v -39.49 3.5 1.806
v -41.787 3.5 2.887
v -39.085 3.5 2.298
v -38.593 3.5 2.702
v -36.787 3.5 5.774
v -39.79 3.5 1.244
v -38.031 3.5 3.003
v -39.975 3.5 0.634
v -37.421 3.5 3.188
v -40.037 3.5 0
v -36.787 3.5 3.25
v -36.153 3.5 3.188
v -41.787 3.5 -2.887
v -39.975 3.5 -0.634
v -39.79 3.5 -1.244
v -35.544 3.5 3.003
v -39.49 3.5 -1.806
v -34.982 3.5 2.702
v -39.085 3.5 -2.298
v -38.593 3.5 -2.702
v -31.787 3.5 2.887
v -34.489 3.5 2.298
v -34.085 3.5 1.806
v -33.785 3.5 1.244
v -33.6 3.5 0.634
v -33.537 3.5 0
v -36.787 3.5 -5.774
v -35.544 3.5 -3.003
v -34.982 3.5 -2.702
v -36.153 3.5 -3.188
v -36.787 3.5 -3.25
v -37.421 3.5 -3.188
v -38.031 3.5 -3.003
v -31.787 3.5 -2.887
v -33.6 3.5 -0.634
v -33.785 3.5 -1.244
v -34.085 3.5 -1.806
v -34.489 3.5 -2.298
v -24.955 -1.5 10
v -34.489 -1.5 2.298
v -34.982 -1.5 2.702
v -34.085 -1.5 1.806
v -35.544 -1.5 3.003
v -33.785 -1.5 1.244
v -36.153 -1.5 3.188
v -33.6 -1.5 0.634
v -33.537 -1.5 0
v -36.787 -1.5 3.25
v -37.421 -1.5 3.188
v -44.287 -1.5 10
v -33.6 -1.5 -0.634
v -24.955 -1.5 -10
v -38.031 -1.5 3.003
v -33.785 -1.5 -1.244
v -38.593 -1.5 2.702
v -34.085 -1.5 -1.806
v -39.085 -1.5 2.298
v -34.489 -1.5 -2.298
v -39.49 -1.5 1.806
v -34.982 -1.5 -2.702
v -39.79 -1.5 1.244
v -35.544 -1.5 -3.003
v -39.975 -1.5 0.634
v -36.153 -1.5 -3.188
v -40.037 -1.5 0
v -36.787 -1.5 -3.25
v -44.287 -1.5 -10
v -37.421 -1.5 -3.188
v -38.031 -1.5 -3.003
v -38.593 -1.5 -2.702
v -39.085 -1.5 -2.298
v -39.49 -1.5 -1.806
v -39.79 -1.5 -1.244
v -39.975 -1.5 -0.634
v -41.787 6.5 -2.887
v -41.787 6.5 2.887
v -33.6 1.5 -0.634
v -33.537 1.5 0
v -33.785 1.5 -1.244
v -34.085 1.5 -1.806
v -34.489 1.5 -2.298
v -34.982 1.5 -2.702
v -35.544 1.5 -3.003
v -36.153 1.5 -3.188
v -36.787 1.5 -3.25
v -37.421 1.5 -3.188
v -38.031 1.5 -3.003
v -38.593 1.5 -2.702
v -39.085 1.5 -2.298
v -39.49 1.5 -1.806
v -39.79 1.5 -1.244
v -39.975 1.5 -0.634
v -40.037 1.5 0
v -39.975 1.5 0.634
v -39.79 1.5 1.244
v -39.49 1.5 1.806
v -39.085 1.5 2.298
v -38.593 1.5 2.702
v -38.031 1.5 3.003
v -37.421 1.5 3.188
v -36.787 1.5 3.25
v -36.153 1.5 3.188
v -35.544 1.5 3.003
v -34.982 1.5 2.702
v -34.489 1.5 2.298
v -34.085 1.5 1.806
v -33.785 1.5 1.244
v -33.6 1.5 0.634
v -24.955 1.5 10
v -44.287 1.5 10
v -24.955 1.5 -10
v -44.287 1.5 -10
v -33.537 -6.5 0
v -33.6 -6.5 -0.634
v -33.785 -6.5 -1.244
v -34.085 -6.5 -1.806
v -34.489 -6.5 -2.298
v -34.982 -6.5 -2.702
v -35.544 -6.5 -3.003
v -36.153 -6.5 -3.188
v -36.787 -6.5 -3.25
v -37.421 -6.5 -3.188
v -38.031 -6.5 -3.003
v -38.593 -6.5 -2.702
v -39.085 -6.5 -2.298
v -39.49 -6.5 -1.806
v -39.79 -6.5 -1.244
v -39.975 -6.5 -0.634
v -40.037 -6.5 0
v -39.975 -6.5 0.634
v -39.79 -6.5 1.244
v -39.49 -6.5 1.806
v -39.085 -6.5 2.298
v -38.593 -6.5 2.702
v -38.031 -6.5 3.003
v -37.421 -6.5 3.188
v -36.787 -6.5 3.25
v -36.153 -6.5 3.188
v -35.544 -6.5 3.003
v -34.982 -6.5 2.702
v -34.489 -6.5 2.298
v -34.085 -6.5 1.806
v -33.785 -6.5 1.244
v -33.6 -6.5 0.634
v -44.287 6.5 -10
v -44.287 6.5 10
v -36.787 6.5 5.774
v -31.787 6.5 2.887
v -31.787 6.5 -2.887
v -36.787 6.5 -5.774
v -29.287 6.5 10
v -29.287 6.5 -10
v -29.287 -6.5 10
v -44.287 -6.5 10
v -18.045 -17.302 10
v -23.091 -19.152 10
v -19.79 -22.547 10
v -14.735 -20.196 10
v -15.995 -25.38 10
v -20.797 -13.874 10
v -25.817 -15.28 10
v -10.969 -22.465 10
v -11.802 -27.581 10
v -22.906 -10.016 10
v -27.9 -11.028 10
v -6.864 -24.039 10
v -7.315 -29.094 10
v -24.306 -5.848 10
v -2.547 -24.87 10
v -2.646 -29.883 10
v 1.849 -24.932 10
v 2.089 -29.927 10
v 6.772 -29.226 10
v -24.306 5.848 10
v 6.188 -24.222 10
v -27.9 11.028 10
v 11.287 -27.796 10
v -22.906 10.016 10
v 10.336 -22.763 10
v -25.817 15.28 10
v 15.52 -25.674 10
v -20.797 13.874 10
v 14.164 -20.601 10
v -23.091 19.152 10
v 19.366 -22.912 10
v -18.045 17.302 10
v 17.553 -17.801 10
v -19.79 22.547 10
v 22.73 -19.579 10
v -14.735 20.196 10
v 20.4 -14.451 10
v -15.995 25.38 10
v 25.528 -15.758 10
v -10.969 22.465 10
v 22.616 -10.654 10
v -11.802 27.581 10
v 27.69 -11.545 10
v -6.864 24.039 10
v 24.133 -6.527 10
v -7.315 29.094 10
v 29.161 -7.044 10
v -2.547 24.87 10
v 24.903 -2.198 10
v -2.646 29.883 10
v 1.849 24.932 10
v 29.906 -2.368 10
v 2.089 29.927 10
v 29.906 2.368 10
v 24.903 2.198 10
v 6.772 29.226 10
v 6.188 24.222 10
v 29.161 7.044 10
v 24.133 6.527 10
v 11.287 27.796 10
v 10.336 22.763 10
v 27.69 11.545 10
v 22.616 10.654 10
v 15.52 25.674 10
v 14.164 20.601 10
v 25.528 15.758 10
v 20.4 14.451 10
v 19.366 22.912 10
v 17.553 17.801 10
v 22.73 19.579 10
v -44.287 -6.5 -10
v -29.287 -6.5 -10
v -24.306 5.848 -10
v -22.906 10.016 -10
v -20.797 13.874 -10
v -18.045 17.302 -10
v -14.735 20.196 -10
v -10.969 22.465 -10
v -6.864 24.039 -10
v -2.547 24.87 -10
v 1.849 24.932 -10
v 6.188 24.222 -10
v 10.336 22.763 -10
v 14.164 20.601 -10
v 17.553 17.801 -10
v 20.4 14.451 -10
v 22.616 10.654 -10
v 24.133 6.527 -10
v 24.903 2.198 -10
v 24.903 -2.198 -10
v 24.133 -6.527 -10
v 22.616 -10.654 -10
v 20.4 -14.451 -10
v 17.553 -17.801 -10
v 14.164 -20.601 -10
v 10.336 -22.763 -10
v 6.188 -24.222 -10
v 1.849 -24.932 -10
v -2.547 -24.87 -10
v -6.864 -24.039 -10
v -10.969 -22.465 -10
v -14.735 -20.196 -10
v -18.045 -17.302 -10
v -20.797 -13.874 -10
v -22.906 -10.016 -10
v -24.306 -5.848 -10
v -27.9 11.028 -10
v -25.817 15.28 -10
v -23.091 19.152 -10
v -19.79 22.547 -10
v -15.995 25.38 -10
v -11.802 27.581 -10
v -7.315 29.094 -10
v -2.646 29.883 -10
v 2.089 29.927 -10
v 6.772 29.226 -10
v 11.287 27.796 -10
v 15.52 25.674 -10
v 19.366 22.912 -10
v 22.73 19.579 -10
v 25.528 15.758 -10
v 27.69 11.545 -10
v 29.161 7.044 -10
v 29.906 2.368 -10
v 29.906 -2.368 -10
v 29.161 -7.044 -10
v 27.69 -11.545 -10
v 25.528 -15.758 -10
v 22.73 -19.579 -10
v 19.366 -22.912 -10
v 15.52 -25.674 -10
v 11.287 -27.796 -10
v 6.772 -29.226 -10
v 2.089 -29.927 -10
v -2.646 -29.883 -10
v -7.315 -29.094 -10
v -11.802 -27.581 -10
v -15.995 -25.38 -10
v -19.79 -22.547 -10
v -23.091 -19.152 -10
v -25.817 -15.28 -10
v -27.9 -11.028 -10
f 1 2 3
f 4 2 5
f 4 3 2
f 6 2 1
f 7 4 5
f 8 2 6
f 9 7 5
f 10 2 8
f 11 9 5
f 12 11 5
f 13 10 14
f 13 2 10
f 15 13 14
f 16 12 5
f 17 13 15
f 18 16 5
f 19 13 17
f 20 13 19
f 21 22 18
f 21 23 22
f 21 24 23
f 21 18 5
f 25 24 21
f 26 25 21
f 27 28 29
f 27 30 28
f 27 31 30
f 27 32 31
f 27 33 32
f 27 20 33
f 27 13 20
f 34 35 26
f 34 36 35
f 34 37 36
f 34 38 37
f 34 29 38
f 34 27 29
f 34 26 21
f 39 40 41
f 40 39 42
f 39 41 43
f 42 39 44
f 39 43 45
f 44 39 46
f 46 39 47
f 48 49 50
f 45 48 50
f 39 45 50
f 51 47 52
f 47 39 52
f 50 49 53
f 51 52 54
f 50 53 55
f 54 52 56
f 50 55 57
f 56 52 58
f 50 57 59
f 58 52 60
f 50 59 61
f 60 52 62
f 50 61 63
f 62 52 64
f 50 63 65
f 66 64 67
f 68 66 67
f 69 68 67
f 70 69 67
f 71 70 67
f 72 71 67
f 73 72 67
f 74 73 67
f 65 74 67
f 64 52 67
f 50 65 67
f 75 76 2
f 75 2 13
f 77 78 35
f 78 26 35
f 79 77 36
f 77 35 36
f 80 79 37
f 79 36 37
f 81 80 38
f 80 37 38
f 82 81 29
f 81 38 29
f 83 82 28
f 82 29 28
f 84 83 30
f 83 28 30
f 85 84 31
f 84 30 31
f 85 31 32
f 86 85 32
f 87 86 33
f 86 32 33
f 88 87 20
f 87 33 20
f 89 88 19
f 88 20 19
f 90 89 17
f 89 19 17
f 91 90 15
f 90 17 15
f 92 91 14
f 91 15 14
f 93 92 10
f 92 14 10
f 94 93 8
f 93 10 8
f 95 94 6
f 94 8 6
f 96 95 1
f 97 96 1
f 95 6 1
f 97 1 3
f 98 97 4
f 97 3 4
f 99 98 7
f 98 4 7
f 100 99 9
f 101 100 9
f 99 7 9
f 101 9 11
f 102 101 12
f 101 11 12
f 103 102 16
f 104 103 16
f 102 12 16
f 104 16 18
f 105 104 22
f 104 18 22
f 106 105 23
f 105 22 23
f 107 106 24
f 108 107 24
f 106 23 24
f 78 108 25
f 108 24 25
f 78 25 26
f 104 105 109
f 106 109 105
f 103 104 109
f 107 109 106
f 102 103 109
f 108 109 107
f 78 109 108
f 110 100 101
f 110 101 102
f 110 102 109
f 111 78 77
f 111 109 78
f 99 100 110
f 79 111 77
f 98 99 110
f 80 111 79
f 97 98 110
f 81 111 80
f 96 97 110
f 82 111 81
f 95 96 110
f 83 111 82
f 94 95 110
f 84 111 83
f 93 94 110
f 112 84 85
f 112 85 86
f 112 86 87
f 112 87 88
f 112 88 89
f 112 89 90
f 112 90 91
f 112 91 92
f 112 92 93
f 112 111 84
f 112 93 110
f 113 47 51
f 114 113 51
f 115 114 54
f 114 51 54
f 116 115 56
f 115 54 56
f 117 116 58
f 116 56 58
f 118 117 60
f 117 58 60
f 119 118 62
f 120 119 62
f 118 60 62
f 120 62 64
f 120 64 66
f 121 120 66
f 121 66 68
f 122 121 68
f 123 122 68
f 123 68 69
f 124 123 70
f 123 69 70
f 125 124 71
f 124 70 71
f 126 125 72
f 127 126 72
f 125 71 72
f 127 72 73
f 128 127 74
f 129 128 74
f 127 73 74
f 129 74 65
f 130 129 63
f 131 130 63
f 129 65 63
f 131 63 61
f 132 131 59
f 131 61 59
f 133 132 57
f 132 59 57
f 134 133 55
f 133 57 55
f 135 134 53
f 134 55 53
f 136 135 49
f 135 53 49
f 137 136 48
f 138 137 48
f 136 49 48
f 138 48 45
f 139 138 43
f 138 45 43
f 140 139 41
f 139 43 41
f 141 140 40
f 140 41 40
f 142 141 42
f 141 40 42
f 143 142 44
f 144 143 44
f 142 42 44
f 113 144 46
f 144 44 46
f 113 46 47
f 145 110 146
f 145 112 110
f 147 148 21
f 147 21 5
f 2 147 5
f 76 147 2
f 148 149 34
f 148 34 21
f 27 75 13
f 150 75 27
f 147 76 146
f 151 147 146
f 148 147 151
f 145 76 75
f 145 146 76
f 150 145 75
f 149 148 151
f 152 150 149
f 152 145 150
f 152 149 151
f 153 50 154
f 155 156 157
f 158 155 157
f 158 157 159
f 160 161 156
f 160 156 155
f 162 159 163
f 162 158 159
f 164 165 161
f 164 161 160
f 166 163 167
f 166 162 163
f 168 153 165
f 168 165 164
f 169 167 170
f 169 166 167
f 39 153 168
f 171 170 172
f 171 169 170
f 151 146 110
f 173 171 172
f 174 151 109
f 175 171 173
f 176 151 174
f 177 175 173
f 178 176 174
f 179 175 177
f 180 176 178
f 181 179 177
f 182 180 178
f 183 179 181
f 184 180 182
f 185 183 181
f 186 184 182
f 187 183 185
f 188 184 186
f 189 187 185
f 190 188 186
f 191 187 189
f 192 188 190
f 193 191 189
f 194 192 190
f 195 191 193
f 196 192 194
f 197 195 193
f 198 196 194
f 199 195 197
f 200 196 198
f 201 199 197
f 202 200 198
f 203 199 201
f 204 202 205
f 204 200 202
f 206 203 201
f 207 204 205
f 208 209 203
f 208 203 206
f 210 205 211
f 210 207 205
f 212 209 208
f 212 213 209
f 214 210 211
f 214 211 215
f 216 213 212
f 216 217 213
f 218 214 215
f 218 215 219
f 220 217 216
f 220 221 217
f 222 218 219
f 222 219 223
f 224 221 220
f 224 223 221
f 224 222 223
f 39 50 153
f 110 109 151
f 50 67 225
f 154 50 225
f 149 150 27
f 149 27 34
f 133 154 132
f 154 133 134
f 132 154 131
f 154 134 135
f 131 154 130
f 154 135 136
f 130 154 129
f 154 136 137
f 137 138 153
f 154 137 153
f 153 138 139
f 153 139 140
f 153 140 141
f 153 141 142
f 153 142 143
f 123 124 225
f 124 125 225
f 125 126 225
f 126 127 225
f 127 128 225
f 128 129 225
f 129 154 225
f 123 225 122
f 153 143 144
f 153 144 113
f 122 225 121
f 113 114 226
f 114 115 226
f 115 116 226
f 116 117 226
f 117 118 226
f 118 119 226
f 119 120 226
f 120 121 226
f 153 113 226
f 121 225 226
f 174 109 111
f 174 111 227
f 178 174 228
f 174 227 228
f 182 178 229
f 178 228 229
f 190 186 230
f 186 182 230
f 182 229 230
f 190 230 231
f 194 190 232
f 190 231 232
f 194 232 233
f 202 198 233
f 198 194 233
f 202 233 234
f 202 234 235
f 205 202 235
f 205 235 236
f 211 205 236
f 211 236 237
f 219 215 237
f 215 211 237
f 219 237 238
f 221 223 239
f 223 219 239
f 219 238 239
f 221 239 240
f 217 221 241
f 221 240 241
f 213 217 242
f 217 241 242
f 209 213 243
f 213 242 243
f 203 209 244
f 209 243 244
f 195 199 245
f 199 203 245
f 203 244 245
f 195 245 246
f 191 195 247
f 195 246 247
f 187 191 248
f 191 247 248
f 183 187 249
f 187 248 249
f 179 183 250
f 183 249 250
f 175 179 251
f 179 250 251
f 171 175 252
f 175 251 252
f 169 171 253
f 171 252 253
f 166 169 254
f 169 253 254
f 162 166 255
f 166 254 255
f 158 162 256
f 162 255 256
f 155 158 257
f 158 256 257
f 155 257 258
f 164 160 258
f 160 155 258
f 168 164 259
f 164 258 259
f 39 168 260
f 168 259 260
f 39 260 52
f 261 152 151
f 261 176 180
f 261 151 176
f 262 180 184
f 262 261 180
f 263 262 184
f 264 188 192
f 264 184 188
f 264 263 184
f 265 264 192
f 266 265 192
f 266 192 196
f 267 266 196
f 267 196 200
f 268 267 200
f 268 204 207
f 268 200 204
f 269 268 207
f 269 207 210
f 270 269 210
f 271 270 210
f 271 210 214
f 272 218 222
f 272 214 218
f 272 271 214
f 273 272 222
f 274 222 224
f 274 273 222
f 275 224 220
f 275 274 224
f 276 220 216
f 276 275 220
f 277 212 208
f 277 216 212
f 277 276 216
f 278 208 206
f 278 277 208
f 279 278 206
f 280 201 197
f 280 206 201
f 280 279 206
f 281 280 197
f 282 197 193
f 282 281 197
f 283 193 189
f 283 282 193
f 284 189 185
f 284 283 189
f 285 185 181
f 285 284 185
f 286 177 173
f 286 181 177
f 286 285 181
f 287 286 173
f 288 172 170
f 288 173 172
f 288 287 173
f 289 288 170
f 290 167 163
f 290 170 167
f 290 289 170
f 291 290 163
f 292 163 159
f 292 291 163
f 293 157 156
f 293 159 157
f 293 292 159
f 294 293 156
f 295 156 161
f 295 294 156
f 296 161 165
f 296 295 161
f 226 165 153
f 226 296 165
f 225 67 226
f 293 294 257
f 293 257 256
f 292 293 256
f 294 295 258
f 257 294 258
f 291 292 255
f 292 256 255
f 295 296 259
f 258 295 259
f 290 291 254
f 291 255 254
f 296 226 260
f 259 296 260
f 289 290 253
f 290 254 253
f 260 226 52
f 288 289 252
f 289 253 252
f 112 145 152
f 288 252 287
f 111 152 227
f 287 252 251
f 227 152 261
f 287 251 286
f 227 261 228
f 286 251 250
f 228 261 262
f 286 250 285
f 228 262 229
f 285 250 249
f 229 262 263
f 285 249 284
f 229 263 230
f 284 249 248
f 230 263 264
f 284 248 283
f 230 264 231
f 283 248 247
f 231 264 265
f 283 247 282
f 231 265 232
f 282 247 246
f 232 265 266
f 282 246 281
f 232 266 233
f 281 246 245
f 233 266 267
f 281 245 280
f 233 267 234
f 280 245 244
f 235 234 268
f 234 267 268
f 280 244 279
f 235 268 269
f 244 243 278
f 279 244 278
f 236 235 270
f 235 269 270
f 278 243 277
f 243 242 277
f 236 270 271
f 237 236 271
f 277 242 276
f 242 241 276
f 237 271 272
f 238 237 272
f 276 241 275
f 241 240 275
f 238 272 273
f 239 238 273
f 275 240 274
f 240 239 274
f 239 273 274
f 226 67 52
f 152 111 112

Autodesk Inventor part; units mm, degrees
ref_plane "YZ Plane" through (0, 0, 0) normal (1, 0, 0) x (0, 1, 0)
ref_plane "XZ Plane" through (0, 0, 0) normal (0, 1, 0) x (-1, 0, 0)
ref_plane "XY Plane" through (0, 0, 0) normal (0, 0, 1) x (1, 0, 0)
sketch "Skizze1" plane through (0, 0, 0) normal (0, 0, 1) x (1, 0, 0)
  circle A0 centre (0, 0) radius 25 construction
  circle A1 centre (0, 0) radius 30 construction
  line L0 (-24.955, 1.5) -> (-44.2874, 1.5)
  line L1 (-44.2874, 1.5) -> (-44.2874, 6.5)
  line L2 (-44.2874, 6.5) -> (-29.2874, 6.5)
  line L3 (-24.955, -1.5) -> (-44.2874, -1.5)
  line L4 (-44.2874, -1.5) -> (-44.2874, -6.5)
  line L5 (-44.2874, -6.5) -> (-29.2874, -6.5)
  arc A2 (-29.2874, -6.5) -> (-29.2874, 6.5) centre (0, 0) ccw
  arc A3 (-24.955, -1.5) -> (-24.955, 1.5) centre (0, 0) ccw
  line L6 (-59.1448, 0) -> (44.8575, 0) construction
  dimension "d0" = 50
  dimension "d1" = 60
  dimension "d2" = 5
  dimension "d4" = 3
  dimension "d5" = 15
extrude "Extrusion1" add sketch "Skizze1" along normal mid plane 20
sketch "Skizze2" plane through (-44.2874, 6.5, 10) normal (0, 1, 0) x (1, 0, 0)
  line L0 (0, 20) -> (15, 0) construction
  line L1 (15, 20) -> (0, 0) construction
  line L2 (2.5, 12.8868) -> (7.5, 15.7735)
  line L3 (7.5, 15.7735) -> (12.5, 12.8868)
  line L4 (12.5, 12.8868) -> (12.5, 7.1132)
  line L5 (12.5, 7.1132) -> (7.5, 4.2265)
  line L6 (7.5, 4.2265) -> (2.5, 7.1132)
  line L7 (2.5, 7.1132) -> (2.5, 12.8868)
  circle A0 centre (7.5, 10) radius 3.25
  point P0 (44.2874, 10)
  dimension "d8" = 10
  dimension "d9" = 6.5
extrude "Extrusion2" cut sketch "Skizze2" against normal through all contours A0
extrude "Extrusion3" cut sketch "Skizze2" against normal blind 3
properties part number "Zyklon_Schelle"
